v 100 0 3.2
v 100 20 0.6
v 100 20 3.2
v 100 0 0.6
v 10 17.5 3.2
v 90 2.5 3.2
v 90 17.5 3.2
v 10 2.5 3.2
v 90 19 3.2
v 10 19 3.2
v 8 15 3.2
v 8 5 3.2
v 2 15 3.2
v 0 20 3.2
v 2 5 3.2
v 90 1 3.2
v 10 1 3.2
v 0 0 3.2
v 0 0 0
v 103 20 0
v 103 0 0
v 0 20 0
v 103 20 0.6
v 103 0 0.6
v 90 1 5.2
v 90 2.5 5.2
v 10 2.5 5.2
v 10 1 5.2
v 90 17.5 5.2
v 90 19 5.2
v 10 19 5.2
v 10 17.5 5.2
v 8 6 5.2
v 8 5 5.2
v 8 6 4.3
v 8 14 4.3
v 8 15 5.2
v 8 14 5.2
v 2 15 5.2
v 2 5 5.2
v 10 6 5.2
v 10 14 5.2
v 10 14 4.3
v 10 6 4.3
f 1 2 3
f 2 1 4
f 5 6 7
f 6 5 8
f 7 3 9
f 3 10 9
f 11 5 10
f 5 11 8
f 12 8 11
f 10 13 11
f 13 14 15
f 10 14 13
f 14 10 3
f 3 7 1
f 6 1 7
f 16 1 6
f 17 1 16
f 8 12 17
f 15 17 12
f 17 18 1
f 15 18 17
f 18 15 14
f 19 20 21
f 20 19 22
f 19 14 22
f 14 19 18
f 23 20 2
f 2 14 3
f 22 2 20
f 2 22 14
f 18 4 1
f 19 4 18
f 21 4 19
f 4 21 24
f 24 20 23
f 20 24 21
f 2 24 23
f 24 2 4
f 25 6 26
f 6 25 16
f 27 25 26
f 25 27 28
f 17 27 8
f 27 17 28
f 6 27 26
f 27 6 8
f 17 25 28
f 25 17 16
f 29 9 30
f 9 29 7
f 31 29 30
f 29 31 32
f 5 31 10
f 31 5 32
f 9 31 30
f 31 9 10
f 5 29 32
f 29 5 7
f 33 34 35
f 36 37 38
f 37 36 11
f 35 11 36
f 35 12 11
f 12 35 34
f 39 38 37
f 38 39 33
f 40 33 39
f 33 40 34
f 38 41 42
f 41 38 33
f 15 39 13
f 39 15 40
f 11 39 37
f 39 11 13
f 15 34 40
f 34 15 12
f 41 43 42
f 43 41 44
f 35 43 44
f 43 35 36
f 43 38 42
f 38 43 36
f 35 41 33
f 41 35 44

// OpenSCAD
// Bag clip with living hinge - PETG, 0.4mm nozzle, no supports
// Printed open flat (two arms end-to-end), closes by folding 180deg about Y.
// Lower arm at origin, upper arm local origin at its hinge edge.

part = "arm_lower"; // [arm_lower, arm_upper, assembly]
cadverify_only = "";

/* Dimensions (mm) */
Lbody = 100;      // arm body length
Wbody = 20;       // arm width
Tbody = 3.2;      // arm thickness
Hhinge = 6;       // total hinge length (gap between bodies)
Hhalf = 3;        // hinge half length per arm
Thinge = 0.6;     // hinge thickness
Bgap = 2.0;       // bag thickness / closed gap
Ttot = Tbody + Bgap; // 5.2 closed inner top
Zpiv = Tbody + Bgap/2; // 4.2 pivot height
Xpiv = Lbody + Hhalf;  // 103 pivot X in assembly

module instance(name, part, unit = 1) {
    echo(cadverify_instance = [name, part, unit]);
    if (cadverify_only == "" || cadverify_only == name) children();
}

// ---------- lower arm geometry (print orientation, min at 0) ----------
module arm_lower() {
    // body
    cube([Lbody, Wbody, Tbody], false);
    // hinge half (thin, on bed), overlap 0.1 into body
    translate([Lbody-0.1, 0, 0])
        cube([Hhalf+0.1, Wbody, Thinge], false);
    // ribs (2mm tall standoff), overlap 0.1 into body
    translate([10, 1, Tbody-0.1])
        cube([80, 1.5, Bgap+0.1], false);
    translate([10, 17.5, Tbody-0.1])
        cube([80, 1.5, Bgap+0.1], false);
    // latch tower, overlap into body
    translate([2, 5, Tbody-0.1])
        cube([6, 10, Bgap+0.1], false);
    // latch lip (cantilever +X), overlap into tower
    translate([7.9, 6, 4.3])
        cube([2.1, 8, 0.9], false);
}

// ---------- upper arm geometry (print orientation, hinge at x=0) ----------
module arm_upper() {
    // hinge half on bed
    cube([Hhalf+0.1, Wbody, Thinge], false);
    // body, overlap into hinge
    translate([Hhalf-0.1, 0, 0])
        cube([Lbody+0.1, Wbody, Tbody], false);
    // latch tower (maps to closed x=12-18), overlap into body
    translate([85, 5, Tbody-0.1])
        cube([6, 10, Bgap+0.1], false);
    // latch lip (extends +X toward free end), overlap into tower
    translate([90.9, 6, 4.2])
        cube([3.1, 8, 1.0], false);
    // thumb tab beyond free end, same thickness as body, overlap
    translate([102.9, 6, 0])
        cube([8.1, 8, Tbody], false);
}

// ---------- part / assembly dispatch ----------
if (part == "arm_lower") {
    echo(cadverify_spec = [
        ["bounds", [[0, 0, 0], [103, 20, 5.2]]],
        ["bodies", 1],
        ["through_holes", 0],
        ["support_faces", [["bed", "-z", 1500]]],
        ["overhangs_allowed", [["latch lip", [[7.5, 5.5, 4.0], [10.5, 14.5, 5.5]]]]],
        ["copies", 1],
        ["details", [
            ["arm", "material", [[10, 5, 0.5], [90, 15, 2.7]], 1],
            ["arm_wall", "thickness", [50, 10, 10], [0, 0, -1], 3.2],
            ["hinge", "thickness", [101.5, 10, 5], [0, 0, -1], 0.6],
            ["rib", "material", [[20, 1.2, 3.5], [80, 2.3, 5.0]], 1],
            ["latch_tower", "material", [[3, 6, 3.5], [7, 14, 5.0]], 1],
            ["latch_lip", "material", [[8.5, 7, 4.5], [9.5, 13, 5.0]], 1],
            ["bag_slot", "void", [[20, 3, 3.5], [80, 17, 5.0]], 1]
        ]]
    ]);
    arm_lower();
} else if (part == "arm_upper") {
    echo(cadverify_spec = [
        ["bounds", [[0, 0, 0], [111, 20, 5.2]]],
        ["bodies", 1],
        ["through_holes", 0],
        ["support_faces", [["bed", "-z", 1500]]],
        ["overhangs_allowed", [["latch lip", [[90.5, 5.5, 4.0], [94.5, 14.5, 5.5]]]]],
        ["copies", 1],
        ["details", [
            ["arm", "material", [[10, 5, 0.5], [80, 15, 2.7]], 1],
            ["arm_wall", "thickness", [50, 10, 10], [0, 0, -1], 3.2],
            ["hinge", "thickness", [1.5, 10, 5], [0, 0, -1], 0.6],
            ["latch_tower", "material", [[86, 6, 3.5], [90, 14, 5.0]], 1],
            ["latch_lip", "material", [[91.5, 7, 4.4], [93.5, 13, 5.0]], 1],
            ["thumb_tab", "material", [[104, 7, 0.5], [110, 13, 2.7]], 1],
            ["field", "void", [[10, 3, 3.5], [80, 17, 5.0]], 1]
        ]]
    ]);
    arm_upper();
} else if (part == "assembly") {
    echo(cadverify_spec = [
        ["bounds", [[0, 0, 0], [214, 20, 5.2]]],
        ["support_faces", [["bed", "-z", 3000]]],
        ["motions", [
            ["close", ["upper"], "rotate", [103, 10, 4.2], [0, 1, 0], [0, 180],
                ["flex", [["upper", "lower", 1.0, "latch snap"]]],
                ["stops", [180]]
            ]
        ]],
        ["assembly_order", [
            [["lower"], [0, 0, 0]],
            [["upper"], [0, 0, -1]]
        ]]
    ]);
    instance("lower", "arm_lower") arm_lower();
    instance("upper", "arm_upper") translate([103, 0, 0]) arm_upper();
}
